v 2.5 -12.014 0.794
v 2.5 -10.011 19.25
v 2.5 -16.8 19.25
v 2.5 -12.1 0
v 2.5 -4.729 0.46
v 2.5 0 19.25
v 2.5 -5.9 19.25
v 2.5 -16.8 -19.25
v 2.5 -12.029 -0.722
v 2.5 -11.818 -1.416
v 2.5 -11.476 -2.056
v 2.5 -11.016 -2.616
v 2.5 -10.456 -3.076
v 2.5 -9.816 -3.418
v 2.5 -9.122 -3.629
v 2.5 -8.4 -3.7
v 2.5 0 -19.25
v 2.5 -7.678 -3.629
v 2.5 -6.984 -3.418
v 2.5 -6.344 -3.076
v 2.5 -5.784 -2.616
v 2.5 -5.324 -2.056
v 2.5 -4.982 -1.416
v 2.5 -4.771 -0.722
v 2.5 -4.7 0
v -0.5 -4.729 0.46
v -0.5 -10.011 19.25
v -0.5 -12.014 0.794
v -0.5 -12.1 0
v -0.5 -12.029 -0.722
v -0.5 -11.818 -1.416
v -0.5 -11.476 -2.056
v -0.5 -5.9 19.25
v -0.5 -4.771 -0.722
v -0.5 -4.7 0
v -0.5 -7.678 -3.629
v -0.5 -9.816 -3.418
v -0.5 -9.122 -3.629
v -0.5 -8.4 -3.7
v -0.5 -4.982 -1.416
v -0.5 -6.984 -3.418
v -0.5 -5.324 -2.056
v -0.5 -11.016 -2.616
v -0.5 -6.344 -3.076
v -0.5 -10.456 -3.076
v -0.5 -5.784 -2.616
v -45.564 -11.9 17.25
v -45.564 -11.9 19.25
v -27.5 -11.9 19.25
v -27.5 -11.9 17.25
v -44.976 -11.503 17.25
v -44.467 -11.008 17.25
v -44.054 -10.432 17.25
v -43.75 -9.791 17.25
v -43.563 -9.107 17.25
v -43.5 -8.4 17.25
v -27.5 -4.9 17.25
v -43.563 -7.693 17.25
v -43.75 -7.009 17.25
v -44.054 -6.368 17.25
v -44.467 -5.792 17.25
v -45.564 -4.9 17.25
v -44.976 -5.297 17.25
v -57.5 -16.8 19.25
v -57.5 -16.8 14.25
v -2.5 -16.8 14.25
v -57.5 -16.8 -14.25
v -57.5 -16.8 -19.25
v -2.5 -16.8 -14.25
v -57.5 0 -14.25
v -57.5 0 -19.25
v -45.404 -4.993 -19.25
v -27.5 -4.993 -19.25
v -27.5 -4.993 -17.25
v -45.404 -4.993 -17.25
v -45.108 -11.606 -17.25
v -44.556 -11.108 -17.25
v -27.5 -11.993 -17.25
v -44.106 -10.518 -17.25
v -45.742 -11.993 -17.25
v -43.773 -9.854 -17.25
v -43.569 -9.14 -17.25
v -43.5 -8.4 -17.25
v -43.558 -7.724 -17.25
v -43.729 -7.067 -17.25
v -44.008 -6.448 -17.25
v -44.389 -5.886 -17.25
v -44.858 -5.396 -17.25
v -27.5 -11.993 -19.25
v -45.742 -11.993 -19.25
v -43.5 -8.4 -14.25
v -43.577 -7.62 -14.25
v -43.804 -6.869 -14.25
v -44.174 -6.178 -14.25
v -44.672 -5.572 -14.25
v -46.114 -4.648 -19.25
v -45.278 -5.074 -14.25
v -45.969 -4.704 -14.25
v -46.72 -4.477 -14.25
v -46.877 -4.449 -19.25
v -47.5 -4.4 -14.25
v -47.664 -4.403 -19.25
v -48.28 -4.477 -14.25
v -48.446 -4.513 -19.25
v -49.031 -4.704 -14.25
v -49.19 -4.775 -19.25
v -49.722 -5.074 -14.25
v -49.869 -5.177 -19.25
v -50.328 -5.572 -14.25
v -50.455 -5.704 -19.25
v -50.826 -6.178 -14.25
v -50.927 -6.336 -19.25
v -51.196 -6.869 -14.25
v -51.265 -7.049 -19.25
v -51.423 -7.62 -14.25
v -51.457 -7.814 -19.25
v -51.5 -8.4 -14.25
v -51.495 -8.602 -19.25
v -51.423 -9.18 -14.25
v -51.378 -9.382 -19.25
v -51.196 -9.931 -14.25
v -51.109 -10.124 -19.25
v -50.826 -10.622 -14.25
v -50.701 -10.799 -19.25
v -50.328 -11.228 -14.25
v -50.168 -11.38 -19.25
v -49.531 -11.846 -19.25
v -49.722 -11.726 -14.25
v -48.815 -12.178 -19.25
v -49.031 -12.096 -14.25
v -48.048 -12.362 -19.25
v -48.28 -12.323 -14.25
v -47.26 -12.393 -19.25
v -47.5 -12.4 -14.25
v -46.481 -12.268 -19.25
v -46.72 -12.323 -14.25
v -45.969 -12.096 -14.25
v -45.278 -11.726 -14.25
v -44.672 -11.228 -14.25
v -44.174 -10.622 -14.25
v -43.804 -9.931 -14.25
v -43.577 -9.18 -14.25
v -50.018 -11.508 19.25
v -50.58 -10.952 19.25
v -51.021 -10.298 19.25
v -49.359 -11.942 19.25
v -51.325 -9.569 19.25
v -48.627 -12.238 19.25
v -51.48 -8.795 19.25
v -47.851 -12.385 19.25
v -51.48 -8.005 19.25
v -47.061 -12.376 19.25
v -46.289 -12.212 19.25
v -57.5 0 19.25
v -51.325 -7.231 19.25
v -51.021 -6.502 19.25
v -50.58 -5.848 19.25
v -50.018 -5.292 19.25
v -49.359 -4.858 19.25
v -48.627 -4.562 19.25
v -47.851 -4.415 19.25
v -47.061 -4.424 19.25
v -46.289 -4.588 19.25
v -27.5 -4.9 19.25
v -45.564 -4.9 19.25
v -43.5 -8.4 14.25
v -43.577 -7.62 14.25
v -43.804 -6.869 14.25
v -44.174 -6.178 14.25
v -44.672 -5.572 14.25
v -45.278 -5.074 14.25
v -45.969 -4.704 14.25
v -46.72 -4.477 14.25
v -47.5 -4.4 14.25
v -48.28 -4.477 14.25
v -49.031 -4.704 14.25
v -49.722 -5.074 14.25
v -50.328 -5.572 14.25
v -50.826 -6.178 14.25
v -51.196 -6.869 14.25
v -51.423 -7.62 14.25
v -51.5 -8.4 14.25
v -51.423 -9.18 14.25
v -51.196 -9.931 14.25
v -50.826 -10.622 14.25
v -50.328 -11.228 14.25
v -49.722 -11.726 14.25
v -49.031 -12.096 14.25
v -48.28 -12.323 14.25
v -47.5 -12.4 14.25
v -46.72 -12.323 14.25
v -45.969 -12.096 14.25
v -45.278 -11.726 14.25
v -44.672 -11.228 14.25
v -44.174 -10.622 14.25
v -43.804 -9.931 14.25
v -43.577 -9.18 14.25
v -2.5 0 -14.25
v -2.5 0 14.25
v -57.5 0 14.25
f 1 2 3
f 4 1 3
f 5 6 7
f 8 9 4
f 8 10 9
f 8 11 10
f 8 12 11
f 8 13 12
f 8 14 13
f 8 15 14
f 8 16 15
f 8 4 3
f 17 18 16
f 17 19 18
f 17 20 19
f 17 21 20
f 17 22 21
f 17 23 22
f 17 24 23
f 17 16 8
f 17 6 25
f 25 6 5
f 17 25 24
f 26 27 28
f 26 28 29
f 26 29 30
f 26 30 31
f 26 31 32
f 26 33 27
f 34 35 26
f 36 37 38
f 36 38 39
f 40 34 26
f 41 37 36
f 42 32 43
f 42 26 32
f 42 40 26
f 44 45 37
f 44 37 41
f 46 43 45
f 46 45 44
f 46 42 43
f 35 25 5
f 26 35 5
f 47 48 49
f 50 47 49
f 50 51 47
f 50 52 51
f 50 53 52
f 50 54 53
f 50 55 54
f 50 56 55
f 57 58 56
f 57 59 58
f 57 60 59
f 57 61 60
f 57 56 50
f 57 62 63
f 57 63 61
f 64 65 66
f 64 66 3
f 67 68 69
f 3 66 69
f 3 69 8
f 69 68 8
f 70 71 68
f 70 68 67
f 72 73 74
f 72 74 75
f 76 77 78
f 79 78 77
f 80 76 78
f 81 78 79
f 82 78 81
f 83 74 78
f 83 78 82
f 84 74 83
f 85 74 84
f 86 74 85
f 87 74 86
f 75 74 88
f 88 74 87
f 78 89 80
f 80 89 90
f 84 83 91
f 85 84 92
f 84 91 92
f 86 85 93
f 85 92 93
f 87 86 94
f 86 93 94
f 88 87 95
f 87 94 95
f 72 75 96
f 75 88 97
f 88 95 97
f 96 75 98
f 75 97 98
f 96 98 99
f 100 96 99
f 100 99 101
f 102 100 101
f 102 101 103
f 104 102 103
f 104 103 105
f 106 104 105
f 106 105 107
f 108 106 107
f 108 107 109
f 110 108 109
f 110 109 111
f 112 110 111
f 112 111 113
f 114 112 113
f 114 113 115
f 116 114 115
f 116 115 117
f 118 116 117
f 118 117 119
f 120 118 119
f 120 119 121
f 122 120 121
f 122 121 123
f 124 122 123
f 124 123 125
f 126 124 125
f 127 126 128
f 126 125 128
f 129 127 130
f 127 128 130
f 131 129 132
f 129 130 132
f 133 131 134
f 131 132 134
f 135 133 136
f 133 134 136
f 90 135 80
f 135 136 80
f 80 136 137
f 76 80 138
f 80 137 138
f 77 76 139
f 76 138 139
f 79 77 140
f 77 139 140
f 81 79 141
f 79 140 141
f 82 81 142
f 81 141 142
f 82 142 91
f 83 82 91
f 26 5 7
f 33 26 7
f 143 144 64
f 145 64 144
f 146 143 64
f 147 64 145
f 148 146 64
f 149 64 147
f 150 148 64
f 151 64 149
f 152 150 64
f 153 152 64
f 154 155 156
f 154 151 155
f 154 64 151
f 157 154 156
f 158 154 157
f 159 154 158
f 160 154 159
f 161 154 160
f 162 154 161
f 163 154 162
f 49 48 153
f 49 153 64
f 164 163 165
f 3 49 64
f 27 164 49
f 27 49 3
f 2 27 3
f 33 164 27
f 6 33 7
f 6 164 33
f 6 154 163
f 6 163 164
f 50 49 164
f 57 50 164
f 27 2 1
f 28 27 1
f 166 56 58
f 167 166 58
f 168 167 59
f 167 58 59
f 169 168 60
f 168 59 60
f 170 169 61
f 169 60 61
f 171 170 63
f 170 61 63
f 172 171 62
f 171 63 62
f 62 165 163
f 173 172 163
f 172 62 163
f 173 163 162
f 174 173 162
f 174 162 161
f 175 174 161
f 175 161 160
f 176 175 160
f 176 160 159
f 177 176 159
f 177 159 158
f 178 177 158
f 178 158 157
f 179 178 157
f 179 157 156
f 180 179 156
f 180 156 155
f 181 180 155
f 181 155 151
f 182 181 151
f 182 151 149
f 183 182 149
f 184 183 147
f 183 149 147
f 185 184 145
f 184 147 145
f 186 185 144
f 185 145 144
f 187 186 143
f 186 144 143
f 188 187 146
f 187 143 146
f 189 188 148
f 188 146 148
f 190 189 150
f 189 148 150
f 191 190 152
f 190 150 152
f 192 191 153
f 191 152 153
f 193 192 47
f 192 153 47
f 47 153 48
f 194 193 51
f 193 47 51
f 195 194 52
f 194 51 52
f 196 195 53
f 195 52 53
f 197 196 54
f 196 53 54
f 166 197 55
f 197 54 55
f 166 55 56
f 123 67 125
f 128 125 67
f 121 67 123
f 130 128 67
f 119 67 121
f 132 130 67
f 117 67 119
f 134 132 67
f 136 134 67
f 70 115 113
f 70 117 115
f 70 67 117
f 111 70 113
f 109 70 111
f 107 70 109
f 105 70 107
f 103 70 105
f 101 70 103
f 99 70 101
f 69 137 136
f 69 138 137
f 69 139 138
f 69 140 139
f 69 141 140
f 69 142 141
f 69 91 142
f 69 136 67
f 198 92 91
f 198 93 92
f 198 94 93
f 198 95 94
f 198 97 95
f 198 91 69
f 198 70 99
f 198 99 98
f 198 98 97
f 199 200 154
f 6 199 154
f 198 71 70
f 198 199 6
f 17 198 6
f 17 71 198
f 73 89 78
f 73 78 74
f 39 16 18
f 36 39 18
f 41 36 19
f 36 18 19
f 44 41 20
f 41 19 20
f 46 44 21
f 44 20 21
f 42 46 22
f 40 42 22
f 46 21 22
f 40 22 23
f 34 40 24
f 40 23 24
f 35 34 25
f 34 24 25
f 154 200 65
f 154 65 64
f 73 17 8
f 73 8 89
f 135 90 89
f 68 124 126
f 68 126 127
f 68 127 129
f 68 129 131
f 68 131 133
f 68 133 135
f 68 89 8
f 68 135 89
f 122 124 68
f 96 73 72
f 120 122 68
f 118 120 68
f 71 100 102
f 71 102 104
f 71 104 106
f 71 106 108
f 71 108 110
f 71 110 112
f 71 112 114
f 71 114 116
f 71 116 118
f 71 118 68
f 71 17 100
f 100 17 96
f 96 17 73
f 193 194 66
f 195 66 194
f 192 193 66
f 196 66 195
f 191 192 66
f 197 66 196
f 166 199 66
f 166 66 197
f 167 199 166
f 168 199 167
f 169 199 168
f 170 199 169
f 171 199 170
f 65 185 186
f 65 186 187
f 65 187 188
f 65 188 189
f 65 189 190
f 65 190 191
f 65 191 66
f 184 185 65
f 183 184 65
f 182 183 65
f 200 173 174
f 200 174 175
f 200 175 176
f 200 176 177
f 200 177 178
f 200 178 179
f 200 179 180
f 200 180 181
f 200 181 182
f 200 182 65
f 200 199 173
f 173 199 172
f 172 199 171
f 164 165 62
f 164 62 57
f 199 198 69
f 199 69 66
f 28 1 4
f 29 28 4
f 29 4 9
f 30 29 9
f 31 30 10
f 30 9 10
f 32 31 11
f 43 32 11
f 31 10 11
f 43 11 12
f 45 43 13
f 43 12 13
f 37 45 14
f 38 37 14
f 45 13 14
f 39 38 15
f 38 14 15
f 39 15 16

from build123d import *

# Parameters (mm, degrees)
BOSS_EXTRUDE2_DEPTH = 16.8
SKETCH5_R           = 4
CUT_EXTRUDE3_DEPTH  = 38.5
SKETCH6_W           = 20
SKETCH6_H           = 7
CUT_EXTRUDE4_DEPTH  = 2
SKETCH8_W           = 20
SKETCH8_H           = 7
CUT_EXTRUDE5_DEPTH  = 2
CUT_EXTRUDE8_DEPTH  = 3


with BuildPart() as part:
    # Sketch1 → Boss-Extrude2 (new body)
    with BuildSketch(Plane(origin=(0, 0, 0), x_dir=(1, 0, 0), z_dir=(0, 1, 0))):
        Polygon((2.5, -14.25), (-2.5, -14.25), (-57.5, -14.25), (-57.5, -19.25), (2.5, -19.25), align=None)
        Polygon((2.5, 14.25), (-2.5, 14.25), (-2.5, -0.75), (-2.5, -14.25), (2.5, -14.25), align=None)
        Polygon((-57.5, 14.25), (-2.5, 14.25), (2.5, 14.25), (2.5, 19.25), (-57.5, 19.25), align=None)
    extrude(amount=-BOSS_EXTRUDE2_DEPTH)

    # Sketch5 → Cut-Extrude3 (cut)
    with BuildSketch(Plane.XY.offset(19.25)):
        with Locations((-47.5, -8.4)):
            Circle(SKETCH5_R)
    extrude(amount=-CUT_EXTRUDE3_DEPTH, mode=Mode.SUBTRACT)

    # Sketch6 → Cut-Extrude4 (cut)
    with BuildSketch(Plane.XY.offset(19.25)):
        with Locations((-37.5, -8.4)):
            Rectangle(SKETCH6_W, SKETCH6_H)
    extrude(amount=-CUT_EXTRUDE4_DEPTH, mode=Mode.SUBTRACT)

    # Sketch8 → Cut-Extrude5 (cut)
    with BuildSketch(Plane(origin=(0, 0, -19.25), x_dir=(-1, 0, 0), z_dir=(0, 0, -1))):
        with Locations((37.5, -8.492973944)):
            Rectangle(SKETCH8_W, SKETCH8_H)
    extrude(amount=-CUT_EXTRUDE5_DEPTH, mode=Mode.SUBTRACT)

    # Sketch9 → Cut-Extrude8 (cut)
    with BuildSketch(Plane(origin=(2.5, 0, 0), x_dir=(0, 0, -1), z_dir=(1, 0, 0))):
        with BuildLine():
            Line((-19.25, -10.011044161), (-0.79368081, -12.013871992))
            ThreePointArc((-0.79368081, -12.013871992), (-3.696113756, -8.2304621), (-0.459513041, -4.728644969))
            Line((-0.459513041, -4.728644969), (-19.25, -5.9))
            Line((-19.25, -5.9), (-19.25, -10.011044161))
        make_face()
        with BuildLine():
            Line((-0.79368081, -12.013871992), (0, -12.1))
            ThreePointArc((0, -12.1), (2.61629509, -11.01629509), (3.7, -8.4))
            ThreePointArc((3.7, -8.4), (2.61629509, -5.78370491), (0, -4.7))
            Line((0, -4.7), (-0.459513041, -4.728644969))
            ThreePointArc((-0.459513041, -4.728644969), (-3.696113756, -8.2304621), (-0.79368081, -12.013871992))
        make_face()
    extrude(amount=-CUT_EXTRUDE8_DEPTH, mode=Mode.SUBTRACT)


solid = part.part
